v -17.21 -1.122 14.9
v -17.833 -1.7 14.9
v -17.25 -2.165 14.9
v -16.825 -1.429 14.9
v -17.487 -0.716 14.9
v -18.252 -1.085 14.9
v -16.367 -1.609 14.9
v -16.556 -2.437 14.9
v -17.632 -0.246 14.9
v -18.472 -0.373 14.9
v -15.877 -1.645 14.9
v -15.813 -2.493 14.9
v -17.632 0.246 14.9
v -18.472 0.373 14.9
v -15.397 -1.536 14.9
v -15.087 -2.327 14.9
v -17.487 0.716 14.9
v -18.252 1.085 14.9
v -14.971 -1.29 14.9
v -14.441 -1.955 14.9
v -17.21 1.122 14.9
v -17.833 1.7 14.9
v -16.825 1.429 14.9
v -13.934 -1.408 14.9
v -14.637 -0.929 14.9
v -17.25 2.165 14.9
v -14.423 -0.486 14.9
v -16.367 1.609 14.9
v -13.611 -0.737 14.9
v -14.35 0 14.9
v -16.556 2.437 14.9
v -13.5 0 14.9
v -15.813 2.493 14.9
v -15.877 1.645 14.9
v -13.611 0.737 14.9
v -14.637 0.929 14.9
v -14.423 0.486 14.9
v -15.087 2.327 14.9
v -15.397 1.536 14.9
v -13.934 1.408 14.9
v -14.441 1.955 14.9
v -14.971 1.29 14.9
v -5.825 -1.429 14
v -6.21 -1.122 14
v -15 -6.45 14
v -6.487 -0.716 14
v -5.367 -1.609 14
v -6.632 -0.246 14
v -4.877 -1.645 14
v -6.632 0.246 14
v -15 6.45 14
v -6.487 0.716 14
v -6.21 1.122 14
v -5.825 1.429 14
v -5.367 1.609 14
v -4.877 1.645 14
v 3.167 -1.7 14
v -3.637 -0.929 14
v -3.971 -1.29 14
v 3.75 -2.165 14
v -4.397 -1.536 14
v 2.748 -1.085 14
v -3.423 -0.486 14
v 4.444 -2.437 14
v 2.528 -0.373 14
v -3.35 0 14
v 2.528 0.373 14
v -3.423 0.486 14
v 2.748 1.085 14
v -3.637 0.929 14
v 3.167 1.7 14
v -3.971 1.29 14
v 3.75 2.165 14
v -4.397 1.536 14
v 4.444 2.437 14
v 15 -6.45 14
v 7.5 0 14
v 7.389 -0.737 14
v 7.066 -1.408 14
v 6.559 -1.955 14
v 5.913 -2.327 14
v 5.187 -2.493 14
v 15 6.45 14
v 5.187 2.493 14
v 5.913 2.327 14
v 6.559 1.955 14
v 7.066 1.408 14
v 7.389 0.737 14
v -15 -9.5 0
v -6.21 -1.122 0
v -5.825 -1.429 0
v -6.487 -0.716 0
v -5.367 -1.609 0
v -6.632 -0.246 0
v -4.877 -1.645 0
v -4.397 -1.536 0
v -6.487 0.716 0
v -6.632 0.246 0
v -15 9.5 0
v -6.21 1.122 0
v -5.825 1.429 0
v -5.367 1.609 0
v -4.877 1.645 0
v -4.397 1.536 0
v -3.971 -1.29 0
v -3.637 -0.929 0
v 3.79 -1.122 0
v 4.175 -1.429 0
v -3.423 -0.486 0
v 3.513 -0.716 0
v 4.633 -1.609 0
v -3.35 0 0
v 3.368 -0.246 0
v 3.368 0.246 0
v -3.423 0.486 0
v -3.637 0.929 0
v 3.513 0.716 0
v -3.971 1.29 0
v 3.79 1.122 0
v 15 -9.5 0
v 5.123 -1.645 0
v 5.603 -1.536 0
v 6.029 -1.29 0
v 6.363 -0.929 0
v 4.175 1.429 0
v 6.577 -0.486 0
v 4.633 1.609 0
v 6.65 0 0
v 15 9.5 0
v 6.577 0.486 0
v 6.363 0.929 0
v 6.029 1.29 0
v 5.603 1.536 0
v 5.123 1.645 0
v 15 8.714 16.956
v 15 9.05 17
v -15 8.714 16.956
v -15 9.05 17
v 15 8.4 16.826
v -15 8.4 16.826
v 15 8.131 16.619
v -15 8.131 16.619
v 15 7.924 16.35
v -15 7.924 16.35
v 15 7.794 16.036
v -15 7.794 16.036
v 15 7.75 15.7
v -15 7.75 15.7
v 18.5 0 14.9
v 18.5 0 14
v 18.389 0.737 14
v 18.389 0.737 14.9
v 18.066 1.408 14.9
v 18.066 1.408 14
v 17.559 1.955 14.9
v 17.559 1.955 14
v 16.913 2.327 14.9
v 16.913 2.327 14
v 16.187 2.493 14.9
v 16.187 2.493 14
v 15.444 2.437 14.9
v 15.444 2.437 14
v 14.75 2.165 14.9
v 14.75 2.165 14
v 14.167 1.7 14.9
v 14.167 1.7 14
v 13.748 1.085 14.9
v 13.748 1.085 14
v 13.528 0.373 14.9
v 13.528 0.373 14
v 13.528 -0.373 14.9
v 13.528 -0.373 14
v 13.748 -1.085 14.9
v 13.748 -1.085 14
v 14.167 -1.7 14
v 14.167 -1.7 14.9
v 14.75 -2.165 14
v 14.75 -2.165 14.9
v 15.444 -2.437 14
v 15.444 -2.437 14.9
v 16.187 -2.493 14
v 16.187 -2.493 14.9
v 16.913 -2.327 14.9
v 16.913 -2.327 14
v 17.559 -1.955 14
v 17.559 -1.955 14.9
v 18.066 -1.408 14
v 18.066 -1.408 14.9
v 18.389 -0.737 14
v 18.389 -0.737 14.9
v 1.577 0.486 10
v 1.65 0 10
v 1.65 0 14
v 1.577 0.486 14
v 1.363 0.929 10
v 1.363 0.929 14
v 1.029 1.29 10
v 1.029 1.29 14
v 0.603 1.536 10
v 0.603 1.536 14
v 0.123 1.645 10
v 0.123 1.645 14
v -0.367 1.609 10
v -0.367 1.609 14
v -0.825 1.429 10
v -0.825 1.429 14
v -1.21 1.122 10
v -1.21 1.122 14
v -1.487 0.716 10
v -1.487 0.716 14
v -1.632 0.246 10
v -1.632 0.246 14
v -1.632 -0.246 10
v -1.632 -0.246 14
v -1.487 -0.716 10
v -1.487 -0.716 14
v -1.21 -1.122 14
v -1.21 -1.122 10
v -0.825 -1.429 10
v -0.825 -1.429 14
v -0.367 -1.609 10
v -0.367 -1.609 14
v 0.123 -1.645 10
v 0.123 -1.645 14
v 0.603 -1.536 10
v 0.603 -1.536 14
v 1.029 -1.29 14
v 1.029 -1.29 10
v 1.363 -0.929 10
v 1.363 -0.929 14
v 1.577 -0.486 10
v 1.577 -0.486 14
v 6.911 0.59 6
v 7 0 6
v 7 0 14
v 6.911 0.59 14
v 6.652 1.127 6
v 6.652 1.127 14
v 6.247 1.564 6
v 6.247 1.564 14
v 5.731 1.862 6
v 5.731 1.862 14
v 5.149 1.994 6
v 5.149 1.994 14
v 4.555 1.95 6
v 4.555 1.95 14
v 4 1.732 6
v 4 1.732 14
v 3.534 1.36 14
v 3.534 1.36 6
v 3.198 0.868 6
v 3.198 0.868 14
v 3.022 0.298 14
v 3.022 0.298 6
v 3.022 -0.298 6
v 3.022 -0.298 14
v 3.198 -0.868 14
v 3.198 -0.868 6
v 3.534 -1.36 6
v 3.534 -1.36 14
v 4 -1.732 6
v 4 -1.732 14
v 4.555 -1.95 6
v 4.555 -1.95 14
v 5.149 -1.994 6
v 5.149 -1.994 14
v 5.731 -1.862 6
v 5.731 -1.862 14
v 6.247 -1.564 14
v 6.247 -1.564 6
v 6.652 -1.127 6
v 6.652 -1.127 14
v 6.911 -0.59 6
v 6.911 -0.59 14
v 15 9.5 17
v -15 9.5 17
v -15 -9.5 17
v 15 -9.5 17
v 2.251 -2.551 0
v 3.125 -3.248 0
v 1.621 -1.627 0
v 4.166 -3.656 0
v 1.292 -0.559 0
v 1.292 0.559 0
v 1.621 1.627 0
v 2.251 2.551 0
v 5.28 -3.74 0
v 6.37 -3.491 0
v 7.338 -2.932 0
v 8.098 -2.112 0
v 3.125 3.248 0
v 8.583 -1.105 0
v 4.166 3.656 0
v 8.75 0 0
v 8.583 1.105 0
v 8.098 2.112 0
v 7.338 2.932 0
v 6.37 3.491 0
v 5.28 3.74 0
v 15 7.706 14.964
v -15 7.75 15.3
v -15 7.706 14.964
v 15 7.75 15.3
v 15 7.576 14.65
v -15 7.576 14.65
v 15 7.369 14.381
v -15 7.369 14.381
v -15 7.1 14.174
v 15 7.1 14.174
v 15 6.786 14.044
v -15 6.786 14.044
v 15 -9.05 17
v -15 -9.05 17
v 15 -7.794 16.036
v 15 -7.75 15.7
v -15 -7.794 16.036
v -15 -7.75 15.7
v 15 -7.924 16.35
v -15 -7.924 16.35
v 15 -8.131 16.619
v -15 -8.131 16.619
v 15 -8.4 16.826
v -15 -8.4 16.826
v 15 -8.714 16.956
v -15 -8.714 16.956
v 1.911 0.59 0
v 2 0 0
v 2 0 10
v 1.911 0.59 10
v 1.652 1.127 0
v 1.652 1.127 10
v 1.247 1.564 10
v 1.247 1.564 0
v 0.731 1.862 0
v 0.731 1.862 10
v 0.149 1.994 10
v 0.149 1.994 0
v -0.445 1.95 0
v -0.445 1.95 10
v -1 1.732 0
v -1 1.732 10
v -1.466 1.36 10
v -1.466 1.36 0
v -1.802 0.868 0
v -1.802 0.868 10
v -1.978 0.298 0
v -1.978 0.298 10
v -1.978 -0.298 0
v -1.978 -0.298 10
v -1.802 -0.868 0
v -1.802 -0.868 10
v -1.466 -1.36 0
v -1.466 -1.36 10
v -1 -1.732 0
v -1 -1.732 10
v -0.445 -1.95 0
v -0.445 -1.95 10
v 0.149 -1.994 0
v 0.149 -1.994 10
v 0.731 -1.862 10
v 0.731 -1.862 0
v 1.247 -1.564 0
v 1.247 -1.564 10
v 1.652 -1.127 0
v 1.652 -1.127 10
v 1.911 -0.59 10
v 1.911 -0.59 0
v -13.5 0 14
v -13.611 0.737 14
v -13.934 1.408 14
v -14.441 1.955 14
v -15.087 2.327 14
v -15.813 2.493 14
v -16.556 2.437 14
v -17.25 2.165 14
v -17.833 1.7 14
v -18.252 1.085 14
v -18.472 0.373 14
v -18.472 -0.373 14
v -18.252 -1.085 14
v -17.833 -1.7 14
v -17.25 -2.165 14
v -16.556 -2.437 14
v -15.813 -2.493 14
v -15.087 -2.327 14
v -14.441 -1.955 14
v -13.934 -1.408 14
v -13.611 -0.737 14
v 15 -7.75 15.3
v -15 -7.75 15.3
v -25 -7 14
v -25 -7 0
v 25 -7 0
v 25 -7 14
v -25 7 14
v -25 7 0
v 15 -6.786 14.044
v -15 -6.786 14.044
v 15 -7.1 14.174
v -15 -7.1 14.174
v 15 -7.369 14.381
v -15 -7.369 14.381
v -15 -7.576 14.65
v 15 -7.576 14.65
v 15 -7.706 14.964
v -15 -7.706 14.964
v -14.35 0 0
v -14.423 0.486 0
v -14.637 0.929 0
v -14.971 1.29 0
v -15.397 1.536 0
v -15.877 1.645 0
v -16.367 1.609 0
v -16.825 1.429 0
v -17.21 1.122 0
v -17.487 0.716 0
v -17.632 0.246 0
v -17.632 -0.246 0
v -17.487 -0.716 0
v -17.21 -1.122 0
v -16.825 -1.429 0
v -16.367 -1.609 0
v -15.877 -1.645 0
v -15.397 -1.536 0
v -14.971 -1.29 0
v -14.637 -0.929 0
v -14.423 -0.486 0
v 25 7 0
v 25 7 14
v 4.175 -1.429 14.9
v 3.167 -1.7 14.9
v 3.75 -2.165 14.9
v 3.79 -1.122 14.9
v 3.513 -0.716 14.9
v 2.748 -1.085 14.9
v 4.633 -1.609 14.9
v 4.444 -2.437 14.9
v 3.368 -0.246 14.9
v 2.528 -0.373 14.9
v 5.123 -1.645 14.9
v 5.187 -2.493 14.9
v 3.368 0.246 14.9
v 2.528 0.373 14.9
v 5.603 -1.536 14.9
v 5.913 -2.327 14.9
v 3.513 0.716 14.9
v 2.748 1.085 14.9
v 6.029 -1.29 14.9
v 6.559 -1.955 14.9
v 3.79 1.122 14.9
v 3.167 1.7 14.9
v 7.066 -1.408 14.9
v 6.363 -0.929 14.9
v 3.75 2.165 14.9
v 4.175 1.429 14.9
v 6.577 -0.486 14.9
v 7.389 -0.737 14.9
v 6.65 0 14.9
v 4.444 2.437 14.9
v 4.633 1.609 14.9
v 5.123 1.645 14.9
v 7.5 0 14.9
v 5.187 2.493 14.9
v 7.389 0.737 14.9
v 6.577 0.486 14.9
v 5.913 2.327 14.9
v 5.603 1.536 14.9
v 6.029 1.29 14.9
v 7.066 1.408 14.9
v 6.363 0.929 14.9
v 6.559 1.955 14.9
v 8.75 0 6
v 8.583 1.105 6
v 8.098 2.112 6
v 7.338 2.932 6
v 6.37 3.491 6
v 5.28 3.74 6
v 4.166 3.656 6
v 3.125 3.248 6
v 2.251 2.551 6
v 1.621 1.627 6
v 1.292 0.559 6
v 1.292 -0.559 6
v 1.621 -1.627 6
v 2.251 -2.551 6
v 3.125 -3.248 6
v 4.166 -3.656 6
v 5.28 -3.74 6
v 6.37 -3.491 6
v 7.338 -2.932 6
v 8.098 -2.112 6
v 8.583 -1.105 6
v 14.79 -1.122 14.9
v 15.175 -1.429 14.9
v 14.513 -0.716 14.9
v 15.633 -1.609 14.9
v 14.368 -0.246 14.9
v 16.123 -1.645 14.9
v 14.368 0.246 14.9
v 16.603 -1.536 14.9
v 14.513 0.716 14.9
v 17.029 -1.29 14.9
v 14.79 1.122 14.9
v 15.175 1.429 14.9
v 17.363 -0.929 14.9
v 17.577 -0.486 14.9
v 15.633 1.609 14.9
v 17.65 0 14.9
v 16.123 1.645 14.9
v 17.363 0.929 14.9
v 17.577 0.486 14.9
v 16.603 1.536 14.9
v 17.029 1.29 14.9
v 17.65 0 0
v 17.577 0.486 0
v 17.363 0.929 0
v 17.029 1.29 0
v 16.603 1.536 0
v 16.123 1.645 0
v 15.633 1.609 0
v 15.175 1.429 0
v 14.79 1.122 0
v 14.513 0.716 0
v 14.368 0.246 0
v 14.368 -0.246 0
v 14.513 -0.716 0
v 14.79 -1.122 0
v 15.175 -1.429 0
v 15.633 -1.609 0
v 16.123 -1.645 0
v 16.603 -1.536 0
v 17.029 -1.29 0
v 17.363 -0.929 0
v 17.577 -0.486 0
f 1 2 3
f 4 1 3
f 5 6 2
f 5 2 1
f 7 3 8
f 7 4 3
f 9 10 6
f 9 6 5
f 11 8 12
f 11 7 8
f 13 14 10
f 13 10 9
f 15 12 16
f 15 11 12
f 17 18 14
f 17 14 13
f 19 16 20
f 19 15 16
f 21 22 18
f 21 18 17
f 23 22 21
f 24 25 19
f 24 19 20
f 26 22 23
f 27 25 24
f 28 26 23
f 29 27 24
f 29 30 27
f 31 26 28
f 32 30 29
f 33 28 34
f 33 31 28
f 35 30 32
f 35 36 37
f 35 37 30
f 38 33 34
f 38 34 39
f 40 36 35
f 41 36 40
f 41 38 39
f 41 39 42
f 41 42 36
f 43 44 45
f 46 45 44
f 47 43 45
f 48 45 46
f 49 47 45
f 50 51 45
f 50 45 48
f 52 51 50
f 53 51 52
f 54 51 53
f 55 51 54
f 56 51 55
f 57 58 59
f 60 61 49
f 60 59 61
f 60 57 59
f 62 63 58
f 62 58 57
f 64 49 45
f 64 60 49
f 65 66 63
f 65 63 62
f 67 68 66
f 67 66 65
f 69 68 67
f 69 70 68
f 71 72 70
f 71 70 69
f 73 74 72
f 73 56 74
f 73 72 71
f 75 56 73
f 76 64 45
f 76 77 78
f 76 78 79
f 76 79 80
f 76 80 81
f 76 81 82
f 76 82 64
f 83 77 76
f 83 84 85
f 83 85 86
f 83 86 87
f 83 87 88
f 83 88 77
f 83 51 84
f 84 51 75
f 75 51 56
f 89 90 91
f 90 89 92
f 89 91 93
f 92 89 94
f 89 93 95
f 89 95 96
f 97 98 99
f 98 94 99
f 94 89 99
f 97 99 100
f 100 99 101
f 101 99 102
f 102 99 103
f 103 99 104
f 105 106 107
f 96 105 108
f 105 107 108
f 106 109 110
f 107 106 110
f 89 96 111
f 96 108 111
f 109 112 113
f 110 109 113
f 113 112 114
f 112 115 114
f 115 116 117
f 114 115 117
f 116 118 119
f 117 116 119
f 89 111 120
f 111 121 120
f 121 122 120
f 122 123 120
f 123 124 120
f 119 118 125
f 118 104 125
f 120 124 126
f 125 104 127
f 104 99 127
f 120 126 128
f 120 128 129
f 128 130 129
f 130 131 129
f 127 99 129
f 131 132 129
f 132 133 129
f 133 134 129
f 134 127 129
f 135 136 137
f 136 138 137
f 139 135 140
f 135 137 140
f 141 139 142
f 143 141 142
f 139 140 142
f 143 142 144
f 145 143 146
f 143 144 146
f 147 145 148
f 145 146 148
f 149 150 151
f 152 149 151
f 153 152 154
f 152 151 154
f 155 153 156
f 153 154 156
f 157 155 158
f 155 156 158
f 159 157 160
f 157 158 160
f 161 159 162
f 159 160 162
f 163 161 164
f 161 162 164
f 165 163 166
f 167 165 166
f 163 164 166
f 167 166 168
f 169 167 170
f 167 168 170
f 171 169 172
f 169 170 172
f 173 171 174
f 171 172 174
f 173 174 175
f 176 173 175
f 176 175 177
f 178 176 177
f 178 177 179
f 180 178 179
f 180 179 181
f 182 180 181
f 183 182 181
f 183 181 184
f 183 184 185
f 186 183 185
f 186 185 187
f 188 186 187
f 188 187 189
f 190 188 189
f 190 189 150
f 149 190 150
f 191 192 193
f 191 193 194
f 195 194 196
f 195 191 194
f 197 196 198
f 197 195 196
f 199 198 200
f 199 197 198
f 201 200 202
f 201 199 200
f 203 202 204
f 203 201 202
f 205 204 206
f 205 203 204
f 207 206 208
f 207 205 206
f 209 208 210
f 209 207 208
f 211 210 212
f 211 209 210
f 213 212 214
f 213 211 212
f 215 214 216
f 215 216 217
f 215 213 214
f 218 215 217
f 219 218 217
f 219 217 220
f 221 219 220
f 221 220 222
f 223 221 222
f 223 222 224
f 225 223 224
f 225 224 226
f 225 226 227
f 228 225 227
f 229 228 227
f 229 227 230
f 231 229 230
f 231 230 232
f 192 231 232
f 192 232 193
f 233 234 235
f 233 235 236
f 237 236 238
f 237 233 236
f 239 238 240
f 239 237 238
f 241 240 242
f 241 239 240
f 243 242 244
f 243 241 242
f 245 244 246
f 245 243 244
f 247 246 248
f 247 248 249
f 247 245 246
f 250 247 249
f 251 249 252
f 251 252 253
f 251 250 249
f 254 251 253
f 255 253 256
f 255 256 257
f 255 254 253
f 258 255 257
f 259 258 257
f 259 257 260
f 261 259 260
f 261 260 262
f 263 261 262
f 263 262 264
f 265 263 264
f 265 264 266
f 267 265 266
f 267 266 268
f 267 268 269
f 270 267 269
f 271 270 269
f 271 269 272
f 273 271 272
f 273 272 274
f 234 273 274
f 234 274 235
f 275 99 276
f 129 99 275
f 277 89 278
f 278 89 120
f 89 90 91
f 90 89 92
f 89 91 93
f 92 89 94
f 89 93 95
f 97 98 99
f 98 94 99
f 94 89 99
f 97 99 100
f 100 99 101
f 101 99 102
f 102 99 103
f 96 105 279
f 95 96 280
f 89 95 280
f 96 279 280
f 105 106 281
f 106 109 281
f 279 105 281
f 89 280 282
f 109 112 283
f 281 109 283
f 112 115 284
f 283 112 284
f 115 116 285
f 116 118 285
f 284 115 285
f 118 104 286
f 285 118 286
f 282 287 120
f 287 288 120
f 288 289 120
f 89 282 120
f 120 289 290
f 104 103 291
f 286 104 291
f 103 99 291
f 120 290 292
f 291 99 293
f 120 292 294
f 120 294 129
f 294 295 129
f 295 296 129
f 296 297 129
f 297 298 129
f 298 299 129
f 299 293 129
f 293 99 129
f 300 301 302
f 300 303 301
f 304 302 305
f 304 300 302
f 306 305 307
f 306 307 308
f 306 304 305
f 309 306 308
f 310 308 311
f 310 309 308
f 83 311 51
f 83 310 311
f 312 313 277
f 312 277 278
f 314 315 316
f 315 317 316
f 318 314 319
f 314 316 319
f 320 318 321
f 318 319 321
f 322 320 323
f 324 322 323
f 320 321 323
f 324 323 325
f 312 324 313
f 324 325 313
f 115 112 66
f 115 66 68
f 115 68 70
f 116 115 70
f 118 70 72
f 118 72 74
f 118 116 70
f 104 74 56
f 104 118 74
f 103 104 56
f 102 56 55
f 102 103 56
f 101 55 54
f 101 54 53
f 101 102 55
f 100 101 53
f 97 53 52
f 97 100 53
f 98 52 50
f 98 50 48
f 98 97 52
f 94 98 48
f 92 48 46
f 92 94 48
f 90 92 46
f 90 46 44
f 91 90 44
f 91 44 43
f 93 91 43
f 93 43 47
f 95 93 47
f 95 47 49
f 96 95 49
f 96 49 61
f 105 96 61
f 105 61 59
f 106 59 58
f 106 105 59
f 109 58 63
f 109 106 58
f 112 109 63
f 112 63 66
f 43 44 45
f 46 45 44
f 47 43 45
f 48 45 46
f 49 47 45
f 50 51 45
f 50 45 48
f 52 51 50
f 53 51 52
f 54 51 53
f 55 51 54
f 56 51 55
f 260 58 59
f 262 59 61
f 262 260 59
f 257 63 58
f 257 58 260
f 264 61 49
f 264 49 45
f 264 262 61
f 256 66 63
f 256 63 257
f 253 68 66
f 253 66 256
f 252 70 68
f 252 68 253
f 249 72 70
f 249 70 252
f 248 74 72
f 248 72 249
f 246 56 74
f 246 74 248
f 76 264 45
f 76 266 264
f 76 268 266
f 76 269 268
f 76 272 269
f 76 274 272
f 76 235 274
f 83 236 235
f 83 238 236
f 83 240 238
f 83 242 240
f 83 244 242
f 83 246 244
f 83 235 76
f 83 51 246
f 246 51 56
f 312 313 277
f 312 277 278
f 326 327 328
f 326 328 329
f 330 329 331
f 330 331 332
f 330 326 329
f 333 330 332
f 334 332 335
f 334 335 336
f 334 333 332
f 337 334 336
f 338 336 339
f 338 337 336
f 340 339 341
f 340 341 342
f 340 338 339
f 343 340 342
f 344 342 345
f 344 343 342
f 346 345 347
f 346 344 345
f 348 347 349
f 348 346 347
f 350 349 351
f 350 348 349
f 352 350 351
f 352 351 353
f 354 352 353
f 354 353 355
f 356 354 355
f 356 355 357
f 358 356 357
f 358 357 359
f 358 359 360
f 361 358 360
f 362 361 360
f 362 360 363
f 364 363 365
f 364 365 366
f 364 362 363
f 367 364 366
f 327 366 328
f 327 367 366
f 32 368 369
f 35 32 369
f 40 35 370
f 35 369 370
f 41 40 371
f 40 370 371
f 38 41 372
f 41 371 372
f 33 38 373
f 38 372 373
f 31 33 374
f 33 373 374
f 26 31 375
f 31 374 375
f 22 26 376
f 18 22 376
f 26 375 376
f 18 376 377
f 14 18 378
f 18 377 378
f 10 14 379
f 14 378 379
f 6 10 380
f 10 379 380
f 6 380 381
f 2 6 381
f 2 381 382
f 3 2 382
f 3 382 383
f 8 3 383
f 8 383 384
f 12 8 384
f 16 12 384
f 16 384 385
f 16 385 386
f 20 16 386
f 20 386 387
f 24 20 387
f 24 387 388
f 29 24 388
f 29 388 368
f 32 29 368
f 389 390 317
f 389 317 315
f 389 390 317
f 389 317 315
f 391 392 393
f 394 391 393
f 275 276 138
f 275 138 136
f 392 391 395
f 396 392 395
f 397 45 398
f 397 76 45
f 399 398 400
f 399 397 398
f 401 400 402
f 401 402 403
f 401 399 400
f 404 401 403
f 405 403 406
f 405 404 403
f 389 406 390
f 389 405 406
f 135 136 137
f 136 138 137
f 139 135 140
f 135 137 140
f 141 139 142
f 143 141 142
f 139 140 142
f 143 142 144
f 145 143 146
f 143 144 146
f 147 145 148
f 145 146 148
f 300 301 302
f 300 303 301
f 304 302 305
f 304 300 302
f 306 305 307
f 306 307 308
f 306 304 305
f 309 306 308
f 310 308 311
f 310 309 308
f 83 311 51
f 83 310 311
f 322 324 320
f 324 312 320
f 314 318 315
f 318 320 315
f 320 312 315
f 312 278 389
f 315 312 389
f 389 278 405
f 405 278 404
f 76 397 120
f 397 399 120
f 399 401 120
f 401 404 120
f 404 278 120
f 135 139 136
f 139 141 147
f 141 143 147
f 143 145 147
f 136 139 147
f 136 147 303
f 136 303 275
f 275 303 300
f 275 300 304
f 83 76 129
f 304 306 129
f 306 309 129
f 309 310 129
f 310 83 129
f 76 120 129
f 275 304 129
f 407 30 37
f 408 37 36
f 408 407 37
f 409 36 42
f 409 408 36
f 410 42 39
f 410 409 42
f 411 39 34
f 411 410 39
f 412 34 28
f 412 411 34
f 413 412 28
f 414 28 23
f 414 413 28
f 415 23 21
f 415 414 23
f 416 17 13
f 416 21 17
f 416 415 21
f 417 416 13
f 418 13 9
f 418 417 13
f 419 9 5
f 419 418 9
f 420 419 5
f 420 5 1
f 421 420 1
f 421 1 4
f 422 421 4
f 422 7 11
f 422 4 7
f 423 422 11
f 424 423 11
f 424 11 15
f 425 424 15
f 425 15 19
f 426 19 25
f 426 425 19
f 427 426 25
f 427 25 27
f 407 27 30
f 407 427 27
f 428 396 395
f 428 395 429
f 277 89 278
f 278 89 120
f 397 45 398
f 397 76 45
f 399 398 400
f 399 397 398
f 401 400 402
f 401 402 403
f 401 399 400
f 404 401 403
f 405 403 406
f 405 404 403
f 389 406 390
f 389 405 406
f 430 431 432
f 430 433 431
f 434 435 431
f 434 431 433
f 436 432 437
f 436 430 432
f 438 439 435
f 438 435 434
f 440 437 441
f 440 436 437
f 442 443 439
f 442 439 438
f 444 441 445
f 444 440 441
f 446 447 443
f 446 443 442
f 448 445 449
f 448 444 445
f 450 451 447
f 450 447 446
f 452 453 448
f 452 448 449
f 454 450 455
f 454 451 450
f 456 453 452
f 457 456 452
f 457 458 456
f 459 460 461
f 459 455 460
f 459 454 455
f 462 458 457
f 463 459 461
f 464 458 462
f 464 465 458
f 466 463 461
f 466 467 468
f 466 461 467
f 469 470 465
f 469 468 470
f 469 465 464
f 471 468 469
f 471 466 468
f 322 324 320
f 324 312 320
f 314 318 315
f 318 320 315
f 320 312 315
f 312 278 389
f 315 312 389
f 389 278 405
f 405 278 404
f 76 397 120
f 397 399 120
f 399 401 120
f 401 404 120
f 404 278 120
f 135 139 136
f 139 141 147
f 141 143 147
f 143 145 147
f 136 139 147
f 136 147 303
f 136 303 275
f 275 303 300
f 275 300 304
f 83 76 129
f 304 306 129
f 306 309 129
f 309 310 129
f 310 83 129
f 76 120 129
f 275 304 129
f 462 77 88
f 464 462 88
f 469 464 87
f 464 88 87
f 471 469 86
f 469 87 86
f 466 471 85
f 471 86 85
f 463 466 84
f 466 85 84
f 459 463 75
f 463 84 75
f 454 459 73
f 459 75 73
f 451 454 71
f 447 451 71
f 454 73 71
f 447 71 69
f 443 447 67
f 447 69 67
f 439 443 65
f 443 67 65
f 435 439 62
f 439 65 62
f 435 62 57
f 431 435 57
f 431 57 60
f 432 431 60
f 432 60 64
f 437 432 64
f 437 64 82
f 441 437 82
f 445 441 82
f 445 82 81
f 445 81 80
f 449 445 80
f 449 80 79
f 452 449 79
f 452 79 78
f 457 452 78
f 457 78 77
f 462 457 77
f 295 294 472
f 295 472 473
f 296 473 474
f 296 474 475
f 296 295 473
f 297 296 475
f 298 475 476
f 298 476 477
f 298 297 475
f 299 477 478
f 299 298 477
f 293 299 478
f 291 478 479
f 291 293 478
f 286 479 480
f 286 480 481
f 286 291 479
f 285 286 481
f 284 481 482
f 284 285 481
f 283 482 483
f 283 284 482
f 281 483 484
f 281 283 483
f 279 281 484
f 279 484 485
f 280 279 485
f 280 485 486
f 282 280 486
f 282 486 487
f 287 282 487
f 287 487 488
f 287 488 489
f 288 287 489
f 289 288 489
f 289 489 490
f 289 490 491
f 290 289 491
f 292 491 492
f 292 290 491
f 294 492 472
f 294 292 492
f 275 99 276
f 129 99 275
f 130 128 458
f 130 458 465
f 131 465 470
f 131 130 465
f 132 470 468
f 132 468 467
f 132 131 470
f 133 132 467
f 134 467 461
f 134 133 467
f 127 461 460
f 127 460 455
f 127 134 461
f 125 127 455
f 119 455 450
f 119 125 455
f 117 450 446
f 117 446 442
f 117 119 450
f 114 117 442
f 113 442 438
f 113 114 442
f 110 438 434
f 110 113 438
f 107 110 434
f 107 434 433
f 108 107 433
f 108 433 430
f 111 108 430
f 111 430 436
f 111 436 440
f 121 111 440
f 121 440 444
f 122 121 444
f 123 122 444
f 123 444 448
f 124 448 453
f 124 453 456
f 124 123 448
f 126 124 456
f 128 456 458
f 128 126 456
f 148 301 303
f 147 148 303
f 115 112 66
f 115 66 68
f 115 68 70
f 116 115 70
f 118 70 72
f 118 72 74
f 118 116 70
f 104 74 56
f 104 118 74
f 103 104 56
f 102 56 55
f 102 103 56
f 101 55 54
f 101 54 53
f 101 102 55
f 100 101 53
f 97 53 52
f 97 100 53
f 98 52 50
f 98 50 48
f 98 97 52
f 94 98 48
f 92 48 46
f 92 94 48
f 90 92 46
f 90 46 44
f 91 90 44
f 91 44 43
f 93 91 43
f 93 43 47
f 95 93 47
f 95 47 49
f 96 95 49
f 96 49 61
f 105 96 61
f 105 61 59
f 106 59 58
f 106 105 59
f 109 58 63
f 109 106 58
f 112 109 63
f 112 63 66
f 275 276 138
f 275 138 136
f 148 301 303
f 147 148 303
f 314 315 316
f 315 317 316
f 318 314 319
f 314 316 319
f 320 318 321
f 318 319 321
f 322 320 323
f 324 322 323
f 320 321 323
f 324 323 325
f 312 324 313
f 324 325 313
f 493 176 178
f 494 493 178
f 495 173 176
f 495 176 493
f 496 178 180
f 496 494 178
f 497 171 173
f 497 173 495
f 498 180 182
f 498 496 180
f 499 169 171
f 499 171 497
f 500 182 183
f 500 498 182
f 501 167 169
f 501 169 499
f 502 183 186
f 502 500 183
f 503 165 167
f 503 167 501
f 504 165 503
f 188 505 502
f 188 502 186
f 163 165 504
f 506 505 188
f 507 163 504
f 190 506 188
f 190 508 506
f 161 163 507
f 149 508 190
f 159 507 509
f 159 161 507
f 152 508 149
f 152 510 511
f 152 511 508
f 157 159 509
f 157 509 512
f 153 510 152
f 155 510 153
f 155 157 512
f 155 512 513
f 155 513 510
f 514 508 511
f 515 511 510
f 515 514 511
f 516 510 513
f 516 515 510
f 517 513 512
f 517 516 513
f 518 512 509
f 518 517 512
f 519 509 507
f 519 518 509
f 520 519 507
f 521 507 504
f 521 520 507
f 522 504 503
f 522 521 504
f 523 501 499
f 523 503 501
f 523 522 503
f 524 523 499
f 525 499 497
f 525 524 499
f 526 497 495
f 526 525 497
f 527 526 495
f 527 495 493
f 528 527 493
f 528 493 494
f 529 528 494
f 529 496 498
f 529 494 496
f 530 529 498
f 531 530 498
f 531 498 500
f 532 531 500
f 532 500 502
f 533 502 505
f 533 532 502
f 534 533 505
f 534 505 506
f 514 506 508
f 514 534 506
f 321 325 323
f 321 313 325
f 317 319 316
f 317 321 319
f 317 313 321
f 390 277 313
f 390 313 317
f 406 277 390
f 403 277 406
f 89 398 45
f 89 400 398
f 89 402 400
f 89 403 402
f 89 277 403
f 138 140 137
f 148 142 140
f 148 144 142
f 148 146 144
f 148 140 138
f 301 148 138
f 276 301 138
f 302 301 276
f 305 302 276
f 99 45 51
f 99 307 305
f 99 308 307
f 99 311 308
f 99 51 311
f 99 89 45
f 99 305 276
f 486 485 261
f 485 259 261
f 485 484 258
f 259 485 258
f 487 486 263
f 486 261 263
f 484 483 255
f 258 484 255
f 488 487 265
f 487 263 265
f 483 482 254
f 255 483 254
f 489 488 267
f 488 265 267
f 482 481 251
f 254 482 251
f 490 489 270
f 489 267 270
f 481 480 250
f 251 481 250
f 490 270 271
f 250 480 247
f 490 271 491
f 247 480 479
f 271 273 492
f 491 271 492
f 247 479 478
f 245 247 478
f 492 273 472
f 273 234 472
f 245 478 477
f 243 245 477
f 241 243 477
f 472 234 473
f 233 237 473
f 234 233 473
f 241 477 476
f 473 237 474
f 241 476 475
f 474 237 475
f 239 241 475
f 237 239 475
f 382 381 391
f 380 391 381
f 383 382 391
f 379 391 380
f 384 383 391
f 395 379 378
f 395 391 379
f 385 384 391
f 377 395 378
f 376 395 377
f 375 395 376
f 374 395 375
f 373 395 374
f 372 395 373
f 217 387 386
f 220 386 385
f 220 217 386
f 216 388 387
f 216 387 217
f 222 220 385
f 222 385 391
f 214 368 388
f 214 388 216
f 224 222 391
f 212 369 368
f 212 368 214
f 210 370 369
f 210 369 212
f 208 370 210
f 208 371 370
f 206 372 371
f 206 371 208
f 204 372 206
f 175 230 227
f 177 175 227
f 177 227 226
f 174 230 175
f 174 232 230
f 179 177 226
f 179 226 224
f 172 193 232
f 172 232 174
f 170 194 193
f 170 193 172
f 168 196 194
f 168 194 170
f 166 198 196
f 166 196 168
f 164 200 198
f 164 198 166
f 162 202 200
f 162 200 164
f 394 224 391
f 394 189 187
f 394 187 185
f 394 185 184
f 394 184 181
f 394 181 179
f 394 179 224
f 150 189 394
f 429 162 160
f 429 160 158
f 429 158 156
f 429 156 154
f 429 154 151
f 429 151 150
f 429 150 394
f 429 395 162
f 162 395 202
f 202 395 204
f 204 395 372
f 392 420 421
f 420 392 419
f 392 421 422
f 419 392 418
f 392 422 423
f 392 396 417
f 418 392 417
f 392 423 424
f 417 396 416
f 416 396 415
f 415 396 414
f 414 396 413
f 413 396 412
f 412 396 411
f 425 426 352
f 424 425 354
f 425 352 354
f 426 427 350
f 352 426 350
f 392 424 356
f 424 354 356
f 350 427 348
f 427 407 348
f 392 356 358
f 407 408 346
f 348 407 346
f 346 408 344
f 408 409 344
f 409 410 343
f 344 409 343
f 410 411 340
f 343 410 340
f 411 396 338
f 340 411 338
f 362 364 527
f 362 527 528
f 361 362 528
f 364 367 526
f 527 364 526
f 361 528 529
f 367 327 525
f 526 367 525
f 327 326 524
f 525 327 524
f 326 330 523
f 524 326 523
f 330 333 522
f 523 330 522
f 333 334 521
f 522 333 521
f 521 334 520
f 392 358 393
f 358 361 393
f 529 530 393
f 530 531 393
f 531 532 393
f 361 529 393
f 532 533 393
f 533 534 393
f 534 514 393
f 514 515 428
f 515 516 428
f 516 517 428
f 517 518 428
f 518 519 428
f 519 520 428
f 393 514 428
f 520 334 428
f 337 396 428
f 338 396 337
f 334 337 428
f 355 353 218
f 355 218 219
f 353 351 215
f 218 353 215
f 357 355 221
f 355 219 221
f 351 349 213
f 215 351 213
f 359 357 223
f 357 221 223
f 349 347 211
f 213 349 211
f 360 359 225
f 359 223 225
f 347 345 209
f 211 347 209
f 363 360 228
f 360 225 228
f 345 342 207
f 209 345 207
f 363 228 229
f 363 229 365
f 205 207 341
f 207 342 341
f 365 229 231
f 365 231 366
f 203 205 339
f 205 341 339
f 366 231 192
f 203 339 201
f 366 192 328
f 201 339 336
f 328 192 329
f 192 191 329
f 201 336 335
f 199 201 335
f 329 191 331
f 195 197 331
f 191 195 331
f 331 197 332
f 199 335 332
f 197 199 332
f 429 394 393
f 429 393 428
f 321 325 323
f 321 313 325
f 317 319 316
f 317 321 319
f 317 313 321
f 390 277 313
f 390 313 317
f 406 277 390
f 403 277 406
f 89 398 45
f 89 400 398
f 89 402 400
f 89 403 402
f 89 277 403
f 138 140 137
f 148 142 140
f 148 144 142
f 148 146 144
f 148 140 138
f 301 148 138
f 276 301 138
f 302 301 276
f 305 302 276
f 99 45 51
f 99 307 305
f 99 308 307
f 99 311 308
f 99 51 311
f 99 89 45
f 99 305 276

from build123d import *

# Parameters (mm, degrees)
CYLINDER005_R     = 1.65
CYLINDER005_DEPTH = 15
CYLINDER006_R     = 1.65
CYLINDER006_DEPTH = 15
CYLINDER004_R     = 2
CYLINDER004_DEPTH = 10
CYLINDER002_R     = 1.65
CYLINDER002_DEPTH = 14
CYLINDER_R        = 2.5
CYLINDER_DEPTH    = 14.9
BOX_W             = 50
BOX_H             = 14
BOX_DEPTH         = 14
CYLINDER001_R     = 2.5
CYLINDER001_DEPTH = 14.9
CYLINDER009_R     = 1.65
CYLINDER009_DEPTH = 14
CYLINDER008_R     = 1.65
CYLINDER008_DEPTH = 14.9
BOX002_W          = 30
BOX002_H          = 15.5
BOX002_DEPTH      = 10
BOX001_W          = 30
BOX001_H          = 19
BOX001_DEPTH      = 17
FILLET_R          = 1.3
CYLINDER007_R     = 2.5
CYLINDER007_DEPTH = 14.9
CYLINDER011_R     = 3.75
CYLINDER011_DEPTH = 6
CYLINDER012_R     = 1.65
CYLINDER012_DEPTH = 14
CYLINDER010_R     = 2
CYLINDER010_DEPTH = 14
BOX004_W          = 30
BOX004_H          = 15.5
BOX004_DEPTH      = 10
BOX003_W          = 30
BOX003_H          = 19
BOX003_DEPTH      = 17
FILLET001_R       = 1.3


with BuildPart() as cylinder005:
    # Cylinder005 → Cylinder005 (new body)
    with BuildSketch(Plane(origin=(16, 0, 0), x_dir=(1, 0, 0), z_dir=(0, 0, 1))):
        Circle(CYLINDER005_R)
    extrude(amount=CYLINDER005_DEPTH)


with BuildPart() as cylinder006:
    # Cylinder006 → Cylinder006 (new body)
    with BuildSketch(Plane(origin=(-16, 0, 0), x_dir=(1, 0, 0), z_dir=(0, 0, 1))):
        Circle(CYLINDER006_R)
    extrude(amount=CYLINDER006_DEPTH)


with BuildPart() as cylinder004:
    # Cylinder004 → Cylinder004 (new body)
    with BuildSketch(Plane.XY):
        Circle(CYLINDER004_R)
    extrude(amount=CYLINDER004_DEPTH)


with BuildPart() as fusion004:
    # Cylinder002 → Cylinder002 (new body)
    with BuildSketch(Plane.XY):
        Circle(CYLINDER002_R)
    extrude(amount=CYLINDER002_DEPTH)

    # Fusion004: union Cylinder005, Cylinder006, Cylinder004
    add(cylinder005.part)
    add(cylinder006.part)
    add(cylinder004.part)


with BuildPart() as cylinder:
    # Cylinder → Cylinder (new body)
    with BuildSketch(Plane(origin=(16, 0, 0), x_dir=(1, 0, 0), z_dir=(0, 0, 1))):
        Circle(CYLINDER_R)
    extrude(amount=CYLINDER_DEPTH)


with BuildPart() as box:
    # Box → Box (new body)
    with BuildSketch(Plane(origin=(-25, -7, 0), x_dir=(1, 0, 0), z_dir=(0, 0, 1))):
        with Locations((25, 7)):
            Rectangle(BOX_W, BOX_H)
    extrude(amount=BOX_DEPTH)


with BuildPart() as cut:
    # Cylinder001 → Cylinder001 (new body)
    with BuildSketch(Plane(origin=(-16, 0, 0), x_dir=(1, 0, 0), z_dir=(0, 0, 1))):
        Circle(CYLINDER001_R)
    extrude(amount=CYLINDER001_DEPTH)

    # Fusion: union Cylinder, Box
    add(cylinder.part)
    add(box.part)

    # Cut: cut Fusion004
    add(fusion004.part, mode=Mode.SUBTRACT)


with BuildPart() as cylinder009:
    # Cylinder009 → Cylinder009 (new body)
    with BuildSketch(Plane(origin=(-5, 0, 0), x_dir=(1, 0, 0), z_dir=(0, 0, 1))):
        Circle(CYLINDER009_R)
    extrude(amount=CYLINDER009_DEPTH)


with BuildPart() as fusion005:
    # Cylinder008 → Cylinder008 (new body)
    with BuildSketch(Plane(origin=(5, 0, 0), x_dir=(1, 0, 0), z_dir=(0, 0, 1))):
        Circle(CYLINDER008_R)
    extrude(amount=CYLINDER008_DEPTH)

    # Fusion005: union Cylinder009
    add(cylinder009.part)


with BuildPart() as box002:
    # Box002 → Box002 (new body)
    with BuildSketch(Plane(origin=(-15, -7.75, 14), x_dir=(1, 0, 0), z_dir=(0, 0, 1))):
        with Locations((15, 7.75)):
            Rectangle(BOX002_W, BOX002_H)
    extrude(amount=BOX002_DEPTH)


with BuildPart() as fillet_body:
    # Box001 → Box001 (new body)
    with BuildSketch(Plane(origin=(-15, -9.5, 0), x_dir=(1, 0, 0), z_dir=(0, 0, 1))):
        with Locations((15, 9.5)):
            Rectangle(BOX001_W, BOX001_H)
    extrude(amount=BOX001_DEPTH)

    # Cut001: cut Box002
    add(box002.part, mode=Mode.SUBTRACT)

    # Fillet
    fillet_edges = [fillet_body.edges().sort_by_distance(p)[0] for p in [
        (0, -7.75, 17),
        (0, -7.75, 14),
        (0, 7.75, 14),
        (0, 7.75, 17),
    ]]
    fillet(fillet_edges, radius=FILLET_R)


with BuildPart() as cut003:
    # Cylinder007 → Cylinder007 (new body)
    with BuildSketch(Plane(origin=(5, 0, 0), x_dir=(1, 0, 0), z_dir=(0, 0, 1))):
        Circle(CYLINDER007_R)
    extrude(amount=CYLINDER007_DEPTH)

    # Fusion002: union Fillet body
    add(fillet_body.part)

    # Cut003: cut Fusion005
    add(fusion005.part, mode=Mode.SUBTRACT)


with BuildPart() as cylinder011:
    # Cylinder011 → Cylinder011 (new body)
    with BuildSketch(Plane(origin=(5, 0, 0), x_dir=(1, 0, 0), z_dir=(0, 0, 1))):
        Circle(CYLINDER011_R)
    extrude(amount=CYLINDER011_DEPTH)


with BuildPart() as cylinder012:
    # Cylinder012 → Cylinder012 (new body)
    with BuildSketch(Plane(origin=(-5, 0, 0), x_dir=(1, 0, 0), z_dir=(0, 0, 1))):
        Circle(CYLINDER012_R)
    extrude(amount=CYLINDER012_DEPTH)


with BuildPart() as fusion006:
    # Cylinder010 → Cylinder010 (new body)
    with BuildSketch(Plane(origin=(5, 0, 0), x_dir=(1, 0, 0), z_dir=(0, 0, 1))):
        Circle(CYLINDER010_R)
    extrude(amount=CYLINDER010_DEPTH)

    # Fusion006: union Cylinder011, Cylinder012
    add(cylinder011.part)
    add(cylinder012.part)


with BuildPart() as box004:
    # Box004 → Box004 (new body)
    with BuildSketch(Plane(origin=(-15, -7.75, 14), x_dir=(1, 0, 0), z_dir=(0, 0, 1))):
        with Locations((15, 7.75)):
            Rectangle(BOX004_W, BOX004_H)
    extrude(amount=BOX004_DEPTH)


with BuildPart() as cut004:
    # Box003 → Box003 (new body)
    with BuildSketch(Plane(origin=(-15, -9.5, 0), x_dir=(1, 0, 0), z_dir=(0, 0, 1))):
        with Locations((15, 9.5)):
            Rectangle(BOX003_W, BOX003_H)
    extrude(amount=BOX003_DEPTH)

    # Cut002: cut Box004
    add(box004.part, mode=Mode.SUBTRACT)

    # Fillet001
    fillet001_edges = [cut004.edges().sort_by_distance(p)[0] for p in [
        (0, -7.75, 17),
        (0, -7.75, 14),
        (0, 7.75, 14),
        (0, 7.75, 17),
    ]]
    fillet(fillet001_edges, radius=FILLET001_R)

    # Cut004: cut Fusion006
    add(fusion006.part, mode=Mode.SUBTRACT)


solid = Compound([cut.part, cut003.part, cut004.part])
